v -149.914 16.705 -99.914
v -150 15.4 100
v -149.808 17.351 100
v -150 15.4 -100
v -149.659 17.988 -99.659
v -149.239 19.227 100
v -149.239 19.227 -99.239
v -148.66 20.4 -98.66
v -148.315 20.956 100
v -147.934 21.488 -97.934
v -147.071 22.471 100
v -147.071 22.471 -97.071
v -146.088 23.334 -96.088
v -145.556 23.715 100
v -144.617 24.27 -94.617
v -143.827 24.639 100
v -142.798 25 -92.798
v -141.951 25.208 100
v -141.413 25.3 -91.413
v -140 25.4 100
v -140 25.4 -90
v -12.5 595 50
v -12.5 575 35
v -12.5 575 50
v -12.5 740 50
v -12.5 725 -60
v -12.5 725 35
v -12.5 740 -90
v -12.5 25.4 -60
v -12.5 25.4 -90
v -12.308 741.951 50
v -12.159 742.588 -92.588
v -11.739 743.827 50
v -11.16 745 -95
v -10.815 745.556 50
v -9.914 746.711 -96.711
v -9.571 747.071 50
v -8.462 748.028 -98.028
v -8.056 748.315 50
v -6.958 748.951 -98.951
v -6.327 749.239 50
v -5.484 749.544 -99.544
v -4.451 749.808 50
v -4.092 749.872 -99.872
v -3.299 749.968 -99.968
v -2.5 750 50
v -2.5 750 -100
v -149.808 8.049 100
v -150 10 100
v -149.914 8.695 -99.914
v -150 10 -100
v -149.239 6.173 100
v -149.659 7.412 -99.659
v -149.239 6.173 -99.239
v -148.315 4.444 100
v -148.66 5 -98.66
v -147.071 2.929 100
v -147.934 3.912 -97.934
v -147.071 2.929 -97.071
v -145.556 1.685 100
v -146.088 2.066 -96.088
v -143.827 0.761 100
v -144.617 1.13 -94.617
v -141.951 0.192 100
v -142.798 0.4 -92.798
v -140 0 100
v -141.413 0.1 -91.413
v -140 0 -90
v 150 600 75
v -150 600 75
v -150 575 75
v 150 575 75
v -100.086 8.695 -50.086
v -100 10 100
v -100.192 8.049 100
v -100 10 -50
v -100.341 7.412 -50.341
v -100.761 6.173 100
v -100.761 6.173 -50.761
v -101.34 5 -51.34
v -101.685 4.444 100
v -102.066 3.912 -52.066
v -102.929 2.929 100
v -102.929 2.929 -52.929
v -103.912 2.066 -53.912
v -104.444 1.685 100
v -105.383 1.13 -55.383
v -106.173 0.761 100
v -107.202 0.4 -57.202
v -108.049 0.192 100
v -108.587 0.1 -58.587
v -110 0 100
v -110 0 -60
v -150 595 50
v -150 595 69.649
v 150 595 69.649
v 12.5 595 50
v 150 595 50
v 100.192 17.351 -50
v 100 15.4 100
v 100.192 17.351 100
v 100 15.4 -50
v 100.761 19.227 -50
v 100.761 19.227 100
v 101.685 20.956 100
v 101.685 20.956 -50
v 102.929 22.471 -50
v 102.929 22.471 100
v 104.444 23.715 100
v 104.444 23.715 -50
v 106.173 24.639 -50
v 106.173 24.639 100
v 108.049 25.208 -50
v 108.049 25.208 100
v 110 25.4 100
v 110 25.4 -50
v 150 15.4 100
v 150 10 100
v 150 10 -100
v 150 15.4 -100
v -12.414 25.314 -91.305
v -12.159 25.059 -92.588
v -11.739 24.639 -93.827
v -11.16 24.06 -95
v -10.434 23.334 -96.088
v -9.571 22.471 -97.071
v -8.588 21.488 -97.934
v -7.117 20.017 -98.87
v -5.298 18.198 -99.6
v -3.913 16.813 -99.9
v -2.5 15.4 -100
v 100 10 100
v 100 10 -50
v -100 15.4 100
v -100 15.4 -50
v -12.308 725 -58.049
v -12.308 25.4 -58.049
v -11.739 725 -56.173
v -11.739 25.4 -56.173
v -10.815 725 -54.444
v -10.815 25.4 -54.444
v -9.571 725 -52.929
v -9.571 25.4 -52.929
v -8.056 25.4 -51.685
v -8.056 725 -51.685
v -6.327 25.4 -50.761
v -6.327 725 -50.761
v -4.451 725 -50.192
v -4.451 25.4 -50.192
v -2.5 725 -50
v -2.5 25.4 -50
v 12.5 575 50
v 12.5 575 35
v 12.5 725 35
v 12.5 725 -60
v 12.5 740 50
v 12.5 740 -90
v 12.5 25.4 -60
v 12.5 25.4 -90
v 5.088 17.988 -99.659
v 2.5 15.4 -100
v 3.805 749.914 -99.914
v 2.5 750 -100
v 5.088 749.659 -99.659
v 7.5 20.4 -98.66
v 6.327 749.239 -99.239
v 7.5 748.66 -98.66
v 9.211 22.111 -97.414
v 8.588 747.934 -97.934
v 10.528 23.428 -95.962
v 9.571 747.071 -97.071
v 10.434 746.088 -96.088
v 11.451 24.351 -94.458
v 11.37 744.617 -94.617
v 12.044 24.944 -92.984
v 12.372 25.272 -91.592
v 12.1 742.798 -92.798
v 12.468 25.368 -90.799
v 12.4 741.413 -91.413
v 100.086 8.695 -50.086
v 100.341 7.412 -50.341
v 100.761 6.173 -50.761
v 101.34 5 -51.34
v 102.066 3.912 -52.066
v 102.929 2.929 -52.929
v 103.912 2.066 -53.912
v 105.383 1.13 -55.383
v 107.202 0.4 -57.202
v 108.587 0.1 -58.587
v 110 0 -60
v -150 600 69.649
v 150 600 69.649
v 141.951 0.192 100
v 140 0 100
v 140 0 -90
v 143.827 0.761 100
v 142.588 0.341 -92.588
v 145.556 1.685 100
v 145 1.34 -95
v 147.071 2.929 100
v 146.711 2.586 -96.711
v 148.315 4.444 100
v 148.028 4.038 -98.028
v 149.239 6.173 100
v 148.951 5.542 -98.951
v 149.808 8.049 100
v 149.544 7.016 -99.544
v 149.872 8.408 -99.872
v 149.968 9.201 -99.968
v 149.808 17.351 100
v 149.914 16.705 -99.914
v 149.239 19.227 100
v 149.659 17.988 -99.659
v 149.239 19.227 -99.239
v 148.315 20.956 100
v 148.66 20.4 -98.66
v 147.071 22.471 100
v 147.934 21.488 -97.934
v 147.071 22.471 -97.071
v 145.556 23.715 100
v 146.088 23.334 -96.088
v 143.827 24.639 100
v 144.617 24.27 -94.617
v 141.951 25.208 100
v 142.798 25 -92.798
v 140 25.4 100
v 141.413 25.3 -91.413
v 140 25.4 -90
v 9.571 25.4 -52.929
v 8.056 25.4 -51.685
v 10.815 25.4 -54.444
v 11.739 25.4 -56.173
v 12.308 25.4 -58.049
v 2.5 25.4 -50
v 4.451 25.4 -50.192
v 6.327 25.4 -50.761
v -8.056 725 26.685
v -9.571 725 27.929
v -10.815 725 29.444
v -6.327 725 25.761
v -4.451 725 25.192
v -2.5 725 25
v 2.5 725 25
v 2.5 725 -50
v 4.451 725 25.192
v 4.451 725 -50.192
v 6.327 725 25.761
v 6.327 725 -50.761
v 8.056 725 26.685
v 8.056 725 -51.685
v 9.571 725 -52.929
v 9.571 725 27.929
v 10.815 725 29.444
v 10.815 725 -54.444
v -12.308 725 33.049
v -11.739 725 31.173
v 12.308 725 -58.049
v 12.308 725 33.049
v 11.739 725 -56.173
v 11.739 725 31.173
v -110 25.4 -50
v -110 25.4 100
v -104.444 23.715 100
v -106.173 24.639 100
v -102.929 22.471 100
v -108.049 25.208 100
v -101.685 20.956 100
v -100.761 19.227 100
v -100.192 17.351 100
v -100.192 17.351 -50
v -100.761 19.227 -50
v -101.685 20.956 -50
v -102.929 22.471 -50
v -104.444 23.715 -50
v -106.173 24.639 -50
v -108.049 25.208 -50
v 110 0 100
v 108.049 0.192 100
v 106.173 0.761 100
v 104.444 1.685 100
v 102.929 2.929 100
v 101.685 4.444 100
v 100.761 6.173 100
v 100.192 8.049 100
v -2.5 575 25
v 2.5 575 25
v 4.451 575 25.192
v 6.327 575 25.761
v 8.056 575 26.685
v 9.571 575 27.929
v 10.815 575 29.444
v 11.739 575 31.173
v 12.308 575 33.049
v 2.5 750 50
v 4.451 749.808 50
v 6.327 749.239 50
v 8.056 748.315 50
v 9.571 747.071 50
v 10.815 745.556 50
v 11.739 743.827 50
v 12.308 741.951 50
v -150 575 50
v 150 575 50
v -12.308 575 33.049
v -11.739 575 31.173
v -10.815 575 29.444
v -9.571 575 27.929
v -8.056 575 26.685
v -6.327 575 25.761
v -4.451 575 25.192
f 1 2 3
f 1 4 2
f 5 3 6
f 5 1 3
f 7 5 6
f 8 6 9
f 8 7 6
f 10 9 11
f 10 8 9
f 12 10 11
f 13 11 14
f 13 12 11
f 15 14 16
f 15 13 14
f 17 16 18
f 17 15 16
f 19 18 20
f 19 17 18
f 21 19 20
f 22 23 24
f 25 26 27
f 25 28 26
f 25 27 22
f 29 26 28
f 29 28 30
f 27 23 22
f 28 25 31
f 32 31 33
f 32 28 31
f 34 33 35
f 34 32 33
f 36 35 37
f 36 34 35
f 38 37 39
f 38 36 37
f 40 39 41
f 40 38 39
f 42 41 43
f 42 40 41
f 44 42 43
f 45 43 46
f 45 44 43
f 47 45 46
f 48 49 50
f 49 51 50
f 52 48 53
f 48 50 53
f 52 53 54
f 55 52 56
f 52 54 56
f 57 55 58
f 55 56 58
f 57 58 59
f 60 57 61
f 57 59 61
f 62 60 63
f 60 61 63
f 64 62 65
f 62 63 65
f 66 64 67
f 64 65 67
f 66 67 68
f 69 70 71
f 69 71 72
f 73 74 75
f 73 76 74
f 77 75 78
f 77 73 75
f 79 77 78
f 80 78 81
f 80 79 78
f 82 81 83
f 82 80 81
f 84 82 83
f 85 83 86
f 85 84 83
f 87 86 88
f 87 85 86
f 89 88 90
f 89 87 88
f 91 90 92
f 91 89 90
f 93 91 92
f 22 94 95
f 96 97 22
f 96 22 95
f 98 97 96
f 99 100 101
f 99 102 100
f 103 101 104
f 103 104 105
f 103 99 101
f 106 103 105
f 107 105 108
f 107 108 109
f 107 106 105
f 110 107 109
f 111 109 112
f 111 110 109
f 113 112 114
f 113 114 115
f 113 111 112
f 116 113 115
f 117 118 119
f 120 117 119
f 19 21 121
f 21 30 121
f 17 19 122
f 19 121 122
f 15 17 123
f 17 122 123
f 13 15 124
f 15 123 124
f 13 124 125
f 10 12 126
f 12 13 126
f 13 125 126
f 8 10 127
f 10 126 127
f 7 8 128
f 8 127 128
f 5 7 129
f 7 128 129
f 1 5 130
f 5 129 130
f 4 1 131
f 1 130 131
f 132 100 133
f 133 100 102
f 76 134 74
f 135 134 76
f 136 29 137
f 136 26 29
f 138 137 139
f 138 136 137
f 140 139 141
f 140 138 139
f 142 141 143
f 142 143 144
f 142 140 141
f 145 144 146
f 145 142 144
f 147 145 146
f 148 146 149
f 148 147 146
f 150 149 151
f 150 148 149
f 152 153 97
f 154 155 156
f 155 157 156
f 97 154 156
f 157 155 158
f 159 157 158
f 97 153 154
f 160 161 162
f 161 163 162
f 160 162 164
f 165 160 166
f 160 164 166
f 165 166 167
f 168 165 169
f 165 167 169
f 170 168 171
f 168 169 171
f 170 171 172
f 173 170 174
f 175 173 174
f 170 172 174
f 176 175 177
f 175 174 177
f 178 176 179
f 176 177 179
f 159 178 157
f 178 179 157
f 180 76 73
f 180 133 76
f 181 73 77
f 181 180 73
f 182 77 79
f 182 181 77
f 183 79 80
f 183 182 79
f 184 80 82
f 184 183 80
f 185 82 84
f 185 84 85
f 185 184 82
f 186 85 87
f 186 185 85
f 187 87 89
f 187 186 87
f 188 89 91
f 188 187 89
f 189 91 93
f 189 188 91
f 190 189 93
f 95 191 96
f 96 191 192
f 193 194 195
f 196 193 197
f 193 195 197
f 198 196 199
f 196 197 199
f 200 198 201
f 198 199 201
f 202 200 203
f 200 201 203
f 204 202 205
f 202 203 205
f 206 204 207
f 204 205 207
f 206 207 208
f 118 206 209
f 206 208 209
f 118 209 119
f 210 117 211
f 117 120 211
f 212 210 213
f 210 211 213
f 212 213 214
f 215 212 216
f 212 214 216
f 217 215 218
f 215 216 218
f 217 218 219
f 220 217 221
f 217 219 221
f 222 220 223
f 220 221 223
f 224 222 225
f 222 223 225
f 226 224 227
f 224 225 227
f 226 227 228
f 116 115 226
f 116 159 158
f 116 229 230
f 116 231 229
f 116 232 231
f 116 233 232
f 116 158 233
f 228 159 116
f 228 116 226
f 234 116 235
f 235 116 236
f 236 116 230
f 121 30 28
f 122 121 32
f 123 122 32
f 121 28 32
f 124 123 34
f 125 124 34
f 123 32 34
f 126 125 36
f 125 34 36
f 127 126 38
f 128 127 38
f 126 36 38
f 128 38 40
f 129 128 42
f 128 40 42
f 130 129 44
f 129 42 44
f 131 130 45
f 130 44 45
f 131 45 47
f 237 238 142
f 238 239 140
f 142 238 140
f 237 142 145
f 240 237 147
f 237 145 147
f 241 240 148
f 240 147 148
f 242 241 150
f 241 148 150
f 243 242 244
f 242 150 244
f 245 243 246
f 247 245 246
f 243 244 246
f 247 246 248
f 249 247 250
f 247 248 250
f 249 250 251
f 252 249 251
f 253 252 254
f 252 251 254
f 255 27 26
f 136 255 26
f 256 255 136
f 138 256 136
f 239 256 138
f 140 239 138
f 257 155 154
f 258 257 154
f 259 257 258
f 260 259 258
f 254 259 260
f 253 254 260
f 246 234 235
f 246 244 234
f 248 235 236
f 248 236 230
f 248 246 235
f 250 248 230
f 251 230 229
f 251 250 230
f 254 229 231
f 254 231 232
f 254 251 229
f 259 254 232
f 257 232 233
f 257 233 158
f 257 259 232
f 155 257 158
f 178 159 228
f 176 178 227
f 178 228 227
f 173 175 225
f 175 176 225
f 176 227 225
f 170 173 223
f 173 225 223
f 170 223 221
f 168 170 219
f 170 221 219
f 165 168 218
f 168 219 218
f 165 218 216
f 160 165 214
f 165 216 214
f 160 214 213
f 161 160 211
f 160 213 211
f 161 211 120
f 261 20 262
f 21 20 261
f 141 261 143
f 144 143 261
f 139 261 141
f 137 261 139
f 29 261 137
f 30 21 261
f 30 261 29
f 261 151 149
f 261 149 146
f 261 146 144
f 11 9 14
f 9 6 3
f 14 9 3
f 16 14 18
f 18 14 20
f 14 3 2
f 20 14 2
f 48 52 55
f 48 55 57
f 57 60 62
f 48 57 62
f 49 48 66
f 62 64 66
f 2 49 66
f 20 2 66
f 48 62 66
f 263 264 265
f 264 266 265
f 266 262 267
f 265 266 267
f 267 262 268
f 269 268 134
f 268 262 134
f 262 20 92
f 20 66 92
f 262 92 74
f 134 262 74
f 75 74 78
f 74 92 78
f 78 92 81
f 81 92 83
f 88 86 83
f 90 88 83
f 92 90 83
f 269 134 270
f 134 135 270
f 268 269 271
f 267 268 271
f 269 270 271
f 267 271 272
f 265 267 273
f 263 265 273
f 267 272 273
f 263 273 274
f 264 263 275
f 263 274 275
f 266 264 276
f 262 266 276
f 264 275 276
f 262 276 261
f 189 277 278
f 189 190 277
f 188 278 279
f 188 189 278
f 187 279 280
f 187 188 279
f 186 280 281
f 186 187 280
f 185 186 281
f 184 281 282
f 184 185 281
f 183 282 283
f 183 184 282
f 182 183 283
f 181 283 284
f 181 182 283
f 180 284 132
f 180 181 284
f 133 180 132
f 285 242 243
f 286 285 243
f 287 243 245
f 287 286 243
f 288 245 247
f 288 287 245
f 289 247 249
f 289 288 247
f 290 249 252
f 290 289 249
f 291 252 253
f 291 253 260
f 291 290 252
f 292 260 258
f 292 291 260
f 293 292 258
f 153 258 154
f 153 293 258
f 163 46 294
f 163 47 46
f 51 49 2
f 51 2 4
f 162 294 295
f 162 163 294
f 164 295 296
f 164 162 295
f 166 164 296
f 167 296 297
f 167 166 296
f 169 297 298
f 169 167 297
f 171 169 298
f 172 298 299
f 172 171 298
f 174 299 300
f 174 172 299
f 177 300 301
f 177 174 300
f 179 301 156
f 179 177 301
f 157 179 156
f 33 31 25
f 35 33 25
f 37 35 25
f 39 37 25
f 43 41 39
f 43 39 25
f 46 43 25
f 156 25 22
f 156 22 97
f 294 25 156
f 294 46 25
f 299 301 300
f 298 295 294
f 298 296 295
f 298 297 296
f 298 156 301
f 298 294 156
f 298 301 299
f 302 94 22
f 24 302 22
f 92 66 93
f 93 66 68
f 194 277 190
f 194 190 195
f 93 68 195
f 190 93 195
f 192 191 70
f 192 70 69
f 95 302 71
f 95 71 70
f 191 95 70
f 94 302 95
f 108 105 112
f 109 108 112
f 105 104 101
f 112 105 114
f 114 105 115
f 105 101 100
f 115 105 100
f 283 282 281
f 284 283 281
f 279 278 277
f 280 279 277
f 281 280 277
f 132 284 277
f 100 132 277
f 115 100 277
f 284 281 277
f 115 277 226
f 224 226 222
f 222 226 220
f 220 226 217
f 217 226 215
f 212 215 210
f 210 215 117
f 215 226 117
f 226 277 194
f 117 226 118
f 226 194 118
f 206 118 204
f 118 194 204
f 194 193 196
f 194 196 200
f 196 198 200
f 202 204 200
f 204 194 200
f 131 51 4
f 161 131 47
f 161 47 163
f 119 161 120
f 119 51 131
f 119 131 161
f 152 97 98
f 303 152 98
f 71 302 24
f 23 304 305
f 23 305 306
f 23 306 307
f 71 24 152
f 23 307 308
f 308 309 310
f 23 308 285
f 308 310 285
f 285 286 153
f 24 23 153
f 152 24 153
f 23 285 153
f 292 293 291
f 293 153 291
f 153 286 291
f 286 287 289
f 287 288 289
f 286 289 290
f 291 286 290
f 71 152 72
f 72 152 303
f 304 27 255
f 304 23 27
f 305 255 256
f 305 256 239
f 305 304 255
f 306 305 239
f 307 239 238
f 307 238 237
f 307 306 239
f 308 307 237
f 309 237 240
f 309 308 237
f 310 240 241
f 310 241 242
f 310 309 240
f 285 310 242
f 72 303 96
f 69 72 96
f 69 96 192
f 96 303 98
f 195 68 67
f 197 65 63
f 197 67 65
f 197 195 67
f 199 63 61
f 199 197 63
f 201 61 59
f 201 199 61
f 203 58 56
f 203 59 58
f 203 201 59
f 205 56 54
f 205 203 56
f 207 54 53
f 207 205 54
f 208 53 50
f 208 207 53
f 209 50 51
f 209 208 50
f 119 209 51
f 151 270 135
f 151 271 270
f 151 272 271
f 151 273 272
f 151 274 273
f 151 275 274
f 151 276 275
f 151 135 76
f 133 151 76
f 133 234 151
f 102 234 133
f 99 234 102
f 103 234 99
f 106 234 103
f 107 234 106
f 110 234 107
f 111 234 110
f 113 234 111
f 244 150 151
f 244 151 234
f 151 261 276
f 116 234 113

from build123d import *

# Parameters (mm, degrees)
SKETCH1_W           = 300
SKETCH1_H           = 200
BOSS_EXTRUDE1_DEPTH = 25.4
SKETCH2_W           = 200
SKETCH2_H           = 150
CUT_EXTRUDE1_DEPTH  = 25.4
SKETCH3_W           = 25
SKETCH3_H           = 50
BOSS_EXTRUDE2_DEPTH = 724.6
SKETCH5_W           = 25
SKETCH5_H           = 25
BOSS_EXTRUDE3_DEPTH = 100
SKETCH6_W           = 25
SKETCH6_H           = 25
BOSS_EXTRUDE4_DEPTH = 150
SKETCH7_W           = 300
SKETCH7_H           = 25
BOSS_EXTRUDE5_DEPTH = 25
SKETCH8_W           = 300
SKETCH8_H           = 19.64917274
CUT_EXTRUDE2_DEPTH  = 5
FILLET1_R           = 10


with BuildPart() as part:
    # Sketch1 → Boss-Extrude1 (new body)
    with BuildSketch(Plane(origin=(0, 0, 0), x_dir=(1, 0, 0), z_dir=(0, 1, 0))):
        Rectangle(SKETCH1_W, SKETCH1_H)
    extrude(amount=BOSS_EXTRUDE1_DEPTH)

    # Sketch2 → Cut-Extrude1 (cut)
    with BuildSketch(Plane(origin=(0, 25.4, 0), x_dir=(1, 0, 0), z_dir=(0, 1, 0))):
        with Locations((0, -25)):
            Rectangle(SKETCH2_W, SKETCH2_H)
    extrude(amount=-CUT_EXTRUDE1_DEPTH, mode=Mode.SUBTRACT)

    # Sketch3 → Boss-Extrude2 (add)
    with BuildSketch(Plane(origin=(0, 25.4, 0), x_dir=(1, 0, 0), z_dir=(0, 1, 0))):
        with Locations((0, 75)):
            Rectangle(SKETCH3_W, SKETCH3_H)
    extrude(amount=BOSS_EXTRUDE2_DEPTH)

    # Sketch5 → Boss-Extrude3 (add)
    with BuildSketch(Plane.XY.offset(-50)):
        with Locations((0, 737.5)):
            Rectangle(SKETCH5_W, SKETCH5_H)
    extrude(amount=BOSS_EXTRUDE3_DEPTH)

    # Sketch6 → Boss-Extrude4 (add)
    with BuildSketch(Plane.XZ.offset(-725)):
        with Locations((0, 37.5)):
            Rectangle(SKETCH6_W, SKETCH6_H)
    extrude(amount=BOSS_EXTRUDE4_DEPTH)

    # Sketch7 → Boss-Extrude5 (add)
    with BuildSketch(Plane.XY.offset(50)):
        with Locations((0, 587.5)):
            Rectangle(SKETCH7_W, SKETCH7_H)
    extrude(amount=BOSS_EXTRUDE5_DEPTH)

    # Sketch8 → Cut-Extrude2 (cut)
    with BuildSketch(Plane(origin=(0, 600, 0), x_dir=(1, 0, 0), z_dir=(0, 1, 0))):
        with Locations((0, -59.82458637)):
            Rectangle(SKETCH8_W, SKETCH8_H)
    extrude(amount=-CUT_EXTRUDE2_DEPTH, mode=Mode.SUBTRACT)

    # Fillet1
    fillet1_edges = [part.edges().sort_by_distance(p)[0] for p in [
        (-150, 25.4, 0),
        (-100, 0, 25),
        (0, 0, -50),
        (100, 0, 25),
        (-100, 25.4, 25),
        (100, 25.4, 25),
        (-81.25, 25.4, -100),
        (12.5, 387.7, -100),
        (-12.5, 387.7, -100),
        (12.5, 750, -25),
        (-12.5, 750, -25),
        (-12.5, 375.2, -50),
        (12.5, 375.2, -50),
        (150, 25.4, 0),
        (-150, 0, 0),
        (0, 0, -100),
        (-12.5, 650, 25),
        (12.5, 650, 25),
        (150, 0, 0),
        (81.25, 25.4, -100),
    ]]
    fillet(fillet1_edges, radius=FILLET1_R)


solid = part.part
